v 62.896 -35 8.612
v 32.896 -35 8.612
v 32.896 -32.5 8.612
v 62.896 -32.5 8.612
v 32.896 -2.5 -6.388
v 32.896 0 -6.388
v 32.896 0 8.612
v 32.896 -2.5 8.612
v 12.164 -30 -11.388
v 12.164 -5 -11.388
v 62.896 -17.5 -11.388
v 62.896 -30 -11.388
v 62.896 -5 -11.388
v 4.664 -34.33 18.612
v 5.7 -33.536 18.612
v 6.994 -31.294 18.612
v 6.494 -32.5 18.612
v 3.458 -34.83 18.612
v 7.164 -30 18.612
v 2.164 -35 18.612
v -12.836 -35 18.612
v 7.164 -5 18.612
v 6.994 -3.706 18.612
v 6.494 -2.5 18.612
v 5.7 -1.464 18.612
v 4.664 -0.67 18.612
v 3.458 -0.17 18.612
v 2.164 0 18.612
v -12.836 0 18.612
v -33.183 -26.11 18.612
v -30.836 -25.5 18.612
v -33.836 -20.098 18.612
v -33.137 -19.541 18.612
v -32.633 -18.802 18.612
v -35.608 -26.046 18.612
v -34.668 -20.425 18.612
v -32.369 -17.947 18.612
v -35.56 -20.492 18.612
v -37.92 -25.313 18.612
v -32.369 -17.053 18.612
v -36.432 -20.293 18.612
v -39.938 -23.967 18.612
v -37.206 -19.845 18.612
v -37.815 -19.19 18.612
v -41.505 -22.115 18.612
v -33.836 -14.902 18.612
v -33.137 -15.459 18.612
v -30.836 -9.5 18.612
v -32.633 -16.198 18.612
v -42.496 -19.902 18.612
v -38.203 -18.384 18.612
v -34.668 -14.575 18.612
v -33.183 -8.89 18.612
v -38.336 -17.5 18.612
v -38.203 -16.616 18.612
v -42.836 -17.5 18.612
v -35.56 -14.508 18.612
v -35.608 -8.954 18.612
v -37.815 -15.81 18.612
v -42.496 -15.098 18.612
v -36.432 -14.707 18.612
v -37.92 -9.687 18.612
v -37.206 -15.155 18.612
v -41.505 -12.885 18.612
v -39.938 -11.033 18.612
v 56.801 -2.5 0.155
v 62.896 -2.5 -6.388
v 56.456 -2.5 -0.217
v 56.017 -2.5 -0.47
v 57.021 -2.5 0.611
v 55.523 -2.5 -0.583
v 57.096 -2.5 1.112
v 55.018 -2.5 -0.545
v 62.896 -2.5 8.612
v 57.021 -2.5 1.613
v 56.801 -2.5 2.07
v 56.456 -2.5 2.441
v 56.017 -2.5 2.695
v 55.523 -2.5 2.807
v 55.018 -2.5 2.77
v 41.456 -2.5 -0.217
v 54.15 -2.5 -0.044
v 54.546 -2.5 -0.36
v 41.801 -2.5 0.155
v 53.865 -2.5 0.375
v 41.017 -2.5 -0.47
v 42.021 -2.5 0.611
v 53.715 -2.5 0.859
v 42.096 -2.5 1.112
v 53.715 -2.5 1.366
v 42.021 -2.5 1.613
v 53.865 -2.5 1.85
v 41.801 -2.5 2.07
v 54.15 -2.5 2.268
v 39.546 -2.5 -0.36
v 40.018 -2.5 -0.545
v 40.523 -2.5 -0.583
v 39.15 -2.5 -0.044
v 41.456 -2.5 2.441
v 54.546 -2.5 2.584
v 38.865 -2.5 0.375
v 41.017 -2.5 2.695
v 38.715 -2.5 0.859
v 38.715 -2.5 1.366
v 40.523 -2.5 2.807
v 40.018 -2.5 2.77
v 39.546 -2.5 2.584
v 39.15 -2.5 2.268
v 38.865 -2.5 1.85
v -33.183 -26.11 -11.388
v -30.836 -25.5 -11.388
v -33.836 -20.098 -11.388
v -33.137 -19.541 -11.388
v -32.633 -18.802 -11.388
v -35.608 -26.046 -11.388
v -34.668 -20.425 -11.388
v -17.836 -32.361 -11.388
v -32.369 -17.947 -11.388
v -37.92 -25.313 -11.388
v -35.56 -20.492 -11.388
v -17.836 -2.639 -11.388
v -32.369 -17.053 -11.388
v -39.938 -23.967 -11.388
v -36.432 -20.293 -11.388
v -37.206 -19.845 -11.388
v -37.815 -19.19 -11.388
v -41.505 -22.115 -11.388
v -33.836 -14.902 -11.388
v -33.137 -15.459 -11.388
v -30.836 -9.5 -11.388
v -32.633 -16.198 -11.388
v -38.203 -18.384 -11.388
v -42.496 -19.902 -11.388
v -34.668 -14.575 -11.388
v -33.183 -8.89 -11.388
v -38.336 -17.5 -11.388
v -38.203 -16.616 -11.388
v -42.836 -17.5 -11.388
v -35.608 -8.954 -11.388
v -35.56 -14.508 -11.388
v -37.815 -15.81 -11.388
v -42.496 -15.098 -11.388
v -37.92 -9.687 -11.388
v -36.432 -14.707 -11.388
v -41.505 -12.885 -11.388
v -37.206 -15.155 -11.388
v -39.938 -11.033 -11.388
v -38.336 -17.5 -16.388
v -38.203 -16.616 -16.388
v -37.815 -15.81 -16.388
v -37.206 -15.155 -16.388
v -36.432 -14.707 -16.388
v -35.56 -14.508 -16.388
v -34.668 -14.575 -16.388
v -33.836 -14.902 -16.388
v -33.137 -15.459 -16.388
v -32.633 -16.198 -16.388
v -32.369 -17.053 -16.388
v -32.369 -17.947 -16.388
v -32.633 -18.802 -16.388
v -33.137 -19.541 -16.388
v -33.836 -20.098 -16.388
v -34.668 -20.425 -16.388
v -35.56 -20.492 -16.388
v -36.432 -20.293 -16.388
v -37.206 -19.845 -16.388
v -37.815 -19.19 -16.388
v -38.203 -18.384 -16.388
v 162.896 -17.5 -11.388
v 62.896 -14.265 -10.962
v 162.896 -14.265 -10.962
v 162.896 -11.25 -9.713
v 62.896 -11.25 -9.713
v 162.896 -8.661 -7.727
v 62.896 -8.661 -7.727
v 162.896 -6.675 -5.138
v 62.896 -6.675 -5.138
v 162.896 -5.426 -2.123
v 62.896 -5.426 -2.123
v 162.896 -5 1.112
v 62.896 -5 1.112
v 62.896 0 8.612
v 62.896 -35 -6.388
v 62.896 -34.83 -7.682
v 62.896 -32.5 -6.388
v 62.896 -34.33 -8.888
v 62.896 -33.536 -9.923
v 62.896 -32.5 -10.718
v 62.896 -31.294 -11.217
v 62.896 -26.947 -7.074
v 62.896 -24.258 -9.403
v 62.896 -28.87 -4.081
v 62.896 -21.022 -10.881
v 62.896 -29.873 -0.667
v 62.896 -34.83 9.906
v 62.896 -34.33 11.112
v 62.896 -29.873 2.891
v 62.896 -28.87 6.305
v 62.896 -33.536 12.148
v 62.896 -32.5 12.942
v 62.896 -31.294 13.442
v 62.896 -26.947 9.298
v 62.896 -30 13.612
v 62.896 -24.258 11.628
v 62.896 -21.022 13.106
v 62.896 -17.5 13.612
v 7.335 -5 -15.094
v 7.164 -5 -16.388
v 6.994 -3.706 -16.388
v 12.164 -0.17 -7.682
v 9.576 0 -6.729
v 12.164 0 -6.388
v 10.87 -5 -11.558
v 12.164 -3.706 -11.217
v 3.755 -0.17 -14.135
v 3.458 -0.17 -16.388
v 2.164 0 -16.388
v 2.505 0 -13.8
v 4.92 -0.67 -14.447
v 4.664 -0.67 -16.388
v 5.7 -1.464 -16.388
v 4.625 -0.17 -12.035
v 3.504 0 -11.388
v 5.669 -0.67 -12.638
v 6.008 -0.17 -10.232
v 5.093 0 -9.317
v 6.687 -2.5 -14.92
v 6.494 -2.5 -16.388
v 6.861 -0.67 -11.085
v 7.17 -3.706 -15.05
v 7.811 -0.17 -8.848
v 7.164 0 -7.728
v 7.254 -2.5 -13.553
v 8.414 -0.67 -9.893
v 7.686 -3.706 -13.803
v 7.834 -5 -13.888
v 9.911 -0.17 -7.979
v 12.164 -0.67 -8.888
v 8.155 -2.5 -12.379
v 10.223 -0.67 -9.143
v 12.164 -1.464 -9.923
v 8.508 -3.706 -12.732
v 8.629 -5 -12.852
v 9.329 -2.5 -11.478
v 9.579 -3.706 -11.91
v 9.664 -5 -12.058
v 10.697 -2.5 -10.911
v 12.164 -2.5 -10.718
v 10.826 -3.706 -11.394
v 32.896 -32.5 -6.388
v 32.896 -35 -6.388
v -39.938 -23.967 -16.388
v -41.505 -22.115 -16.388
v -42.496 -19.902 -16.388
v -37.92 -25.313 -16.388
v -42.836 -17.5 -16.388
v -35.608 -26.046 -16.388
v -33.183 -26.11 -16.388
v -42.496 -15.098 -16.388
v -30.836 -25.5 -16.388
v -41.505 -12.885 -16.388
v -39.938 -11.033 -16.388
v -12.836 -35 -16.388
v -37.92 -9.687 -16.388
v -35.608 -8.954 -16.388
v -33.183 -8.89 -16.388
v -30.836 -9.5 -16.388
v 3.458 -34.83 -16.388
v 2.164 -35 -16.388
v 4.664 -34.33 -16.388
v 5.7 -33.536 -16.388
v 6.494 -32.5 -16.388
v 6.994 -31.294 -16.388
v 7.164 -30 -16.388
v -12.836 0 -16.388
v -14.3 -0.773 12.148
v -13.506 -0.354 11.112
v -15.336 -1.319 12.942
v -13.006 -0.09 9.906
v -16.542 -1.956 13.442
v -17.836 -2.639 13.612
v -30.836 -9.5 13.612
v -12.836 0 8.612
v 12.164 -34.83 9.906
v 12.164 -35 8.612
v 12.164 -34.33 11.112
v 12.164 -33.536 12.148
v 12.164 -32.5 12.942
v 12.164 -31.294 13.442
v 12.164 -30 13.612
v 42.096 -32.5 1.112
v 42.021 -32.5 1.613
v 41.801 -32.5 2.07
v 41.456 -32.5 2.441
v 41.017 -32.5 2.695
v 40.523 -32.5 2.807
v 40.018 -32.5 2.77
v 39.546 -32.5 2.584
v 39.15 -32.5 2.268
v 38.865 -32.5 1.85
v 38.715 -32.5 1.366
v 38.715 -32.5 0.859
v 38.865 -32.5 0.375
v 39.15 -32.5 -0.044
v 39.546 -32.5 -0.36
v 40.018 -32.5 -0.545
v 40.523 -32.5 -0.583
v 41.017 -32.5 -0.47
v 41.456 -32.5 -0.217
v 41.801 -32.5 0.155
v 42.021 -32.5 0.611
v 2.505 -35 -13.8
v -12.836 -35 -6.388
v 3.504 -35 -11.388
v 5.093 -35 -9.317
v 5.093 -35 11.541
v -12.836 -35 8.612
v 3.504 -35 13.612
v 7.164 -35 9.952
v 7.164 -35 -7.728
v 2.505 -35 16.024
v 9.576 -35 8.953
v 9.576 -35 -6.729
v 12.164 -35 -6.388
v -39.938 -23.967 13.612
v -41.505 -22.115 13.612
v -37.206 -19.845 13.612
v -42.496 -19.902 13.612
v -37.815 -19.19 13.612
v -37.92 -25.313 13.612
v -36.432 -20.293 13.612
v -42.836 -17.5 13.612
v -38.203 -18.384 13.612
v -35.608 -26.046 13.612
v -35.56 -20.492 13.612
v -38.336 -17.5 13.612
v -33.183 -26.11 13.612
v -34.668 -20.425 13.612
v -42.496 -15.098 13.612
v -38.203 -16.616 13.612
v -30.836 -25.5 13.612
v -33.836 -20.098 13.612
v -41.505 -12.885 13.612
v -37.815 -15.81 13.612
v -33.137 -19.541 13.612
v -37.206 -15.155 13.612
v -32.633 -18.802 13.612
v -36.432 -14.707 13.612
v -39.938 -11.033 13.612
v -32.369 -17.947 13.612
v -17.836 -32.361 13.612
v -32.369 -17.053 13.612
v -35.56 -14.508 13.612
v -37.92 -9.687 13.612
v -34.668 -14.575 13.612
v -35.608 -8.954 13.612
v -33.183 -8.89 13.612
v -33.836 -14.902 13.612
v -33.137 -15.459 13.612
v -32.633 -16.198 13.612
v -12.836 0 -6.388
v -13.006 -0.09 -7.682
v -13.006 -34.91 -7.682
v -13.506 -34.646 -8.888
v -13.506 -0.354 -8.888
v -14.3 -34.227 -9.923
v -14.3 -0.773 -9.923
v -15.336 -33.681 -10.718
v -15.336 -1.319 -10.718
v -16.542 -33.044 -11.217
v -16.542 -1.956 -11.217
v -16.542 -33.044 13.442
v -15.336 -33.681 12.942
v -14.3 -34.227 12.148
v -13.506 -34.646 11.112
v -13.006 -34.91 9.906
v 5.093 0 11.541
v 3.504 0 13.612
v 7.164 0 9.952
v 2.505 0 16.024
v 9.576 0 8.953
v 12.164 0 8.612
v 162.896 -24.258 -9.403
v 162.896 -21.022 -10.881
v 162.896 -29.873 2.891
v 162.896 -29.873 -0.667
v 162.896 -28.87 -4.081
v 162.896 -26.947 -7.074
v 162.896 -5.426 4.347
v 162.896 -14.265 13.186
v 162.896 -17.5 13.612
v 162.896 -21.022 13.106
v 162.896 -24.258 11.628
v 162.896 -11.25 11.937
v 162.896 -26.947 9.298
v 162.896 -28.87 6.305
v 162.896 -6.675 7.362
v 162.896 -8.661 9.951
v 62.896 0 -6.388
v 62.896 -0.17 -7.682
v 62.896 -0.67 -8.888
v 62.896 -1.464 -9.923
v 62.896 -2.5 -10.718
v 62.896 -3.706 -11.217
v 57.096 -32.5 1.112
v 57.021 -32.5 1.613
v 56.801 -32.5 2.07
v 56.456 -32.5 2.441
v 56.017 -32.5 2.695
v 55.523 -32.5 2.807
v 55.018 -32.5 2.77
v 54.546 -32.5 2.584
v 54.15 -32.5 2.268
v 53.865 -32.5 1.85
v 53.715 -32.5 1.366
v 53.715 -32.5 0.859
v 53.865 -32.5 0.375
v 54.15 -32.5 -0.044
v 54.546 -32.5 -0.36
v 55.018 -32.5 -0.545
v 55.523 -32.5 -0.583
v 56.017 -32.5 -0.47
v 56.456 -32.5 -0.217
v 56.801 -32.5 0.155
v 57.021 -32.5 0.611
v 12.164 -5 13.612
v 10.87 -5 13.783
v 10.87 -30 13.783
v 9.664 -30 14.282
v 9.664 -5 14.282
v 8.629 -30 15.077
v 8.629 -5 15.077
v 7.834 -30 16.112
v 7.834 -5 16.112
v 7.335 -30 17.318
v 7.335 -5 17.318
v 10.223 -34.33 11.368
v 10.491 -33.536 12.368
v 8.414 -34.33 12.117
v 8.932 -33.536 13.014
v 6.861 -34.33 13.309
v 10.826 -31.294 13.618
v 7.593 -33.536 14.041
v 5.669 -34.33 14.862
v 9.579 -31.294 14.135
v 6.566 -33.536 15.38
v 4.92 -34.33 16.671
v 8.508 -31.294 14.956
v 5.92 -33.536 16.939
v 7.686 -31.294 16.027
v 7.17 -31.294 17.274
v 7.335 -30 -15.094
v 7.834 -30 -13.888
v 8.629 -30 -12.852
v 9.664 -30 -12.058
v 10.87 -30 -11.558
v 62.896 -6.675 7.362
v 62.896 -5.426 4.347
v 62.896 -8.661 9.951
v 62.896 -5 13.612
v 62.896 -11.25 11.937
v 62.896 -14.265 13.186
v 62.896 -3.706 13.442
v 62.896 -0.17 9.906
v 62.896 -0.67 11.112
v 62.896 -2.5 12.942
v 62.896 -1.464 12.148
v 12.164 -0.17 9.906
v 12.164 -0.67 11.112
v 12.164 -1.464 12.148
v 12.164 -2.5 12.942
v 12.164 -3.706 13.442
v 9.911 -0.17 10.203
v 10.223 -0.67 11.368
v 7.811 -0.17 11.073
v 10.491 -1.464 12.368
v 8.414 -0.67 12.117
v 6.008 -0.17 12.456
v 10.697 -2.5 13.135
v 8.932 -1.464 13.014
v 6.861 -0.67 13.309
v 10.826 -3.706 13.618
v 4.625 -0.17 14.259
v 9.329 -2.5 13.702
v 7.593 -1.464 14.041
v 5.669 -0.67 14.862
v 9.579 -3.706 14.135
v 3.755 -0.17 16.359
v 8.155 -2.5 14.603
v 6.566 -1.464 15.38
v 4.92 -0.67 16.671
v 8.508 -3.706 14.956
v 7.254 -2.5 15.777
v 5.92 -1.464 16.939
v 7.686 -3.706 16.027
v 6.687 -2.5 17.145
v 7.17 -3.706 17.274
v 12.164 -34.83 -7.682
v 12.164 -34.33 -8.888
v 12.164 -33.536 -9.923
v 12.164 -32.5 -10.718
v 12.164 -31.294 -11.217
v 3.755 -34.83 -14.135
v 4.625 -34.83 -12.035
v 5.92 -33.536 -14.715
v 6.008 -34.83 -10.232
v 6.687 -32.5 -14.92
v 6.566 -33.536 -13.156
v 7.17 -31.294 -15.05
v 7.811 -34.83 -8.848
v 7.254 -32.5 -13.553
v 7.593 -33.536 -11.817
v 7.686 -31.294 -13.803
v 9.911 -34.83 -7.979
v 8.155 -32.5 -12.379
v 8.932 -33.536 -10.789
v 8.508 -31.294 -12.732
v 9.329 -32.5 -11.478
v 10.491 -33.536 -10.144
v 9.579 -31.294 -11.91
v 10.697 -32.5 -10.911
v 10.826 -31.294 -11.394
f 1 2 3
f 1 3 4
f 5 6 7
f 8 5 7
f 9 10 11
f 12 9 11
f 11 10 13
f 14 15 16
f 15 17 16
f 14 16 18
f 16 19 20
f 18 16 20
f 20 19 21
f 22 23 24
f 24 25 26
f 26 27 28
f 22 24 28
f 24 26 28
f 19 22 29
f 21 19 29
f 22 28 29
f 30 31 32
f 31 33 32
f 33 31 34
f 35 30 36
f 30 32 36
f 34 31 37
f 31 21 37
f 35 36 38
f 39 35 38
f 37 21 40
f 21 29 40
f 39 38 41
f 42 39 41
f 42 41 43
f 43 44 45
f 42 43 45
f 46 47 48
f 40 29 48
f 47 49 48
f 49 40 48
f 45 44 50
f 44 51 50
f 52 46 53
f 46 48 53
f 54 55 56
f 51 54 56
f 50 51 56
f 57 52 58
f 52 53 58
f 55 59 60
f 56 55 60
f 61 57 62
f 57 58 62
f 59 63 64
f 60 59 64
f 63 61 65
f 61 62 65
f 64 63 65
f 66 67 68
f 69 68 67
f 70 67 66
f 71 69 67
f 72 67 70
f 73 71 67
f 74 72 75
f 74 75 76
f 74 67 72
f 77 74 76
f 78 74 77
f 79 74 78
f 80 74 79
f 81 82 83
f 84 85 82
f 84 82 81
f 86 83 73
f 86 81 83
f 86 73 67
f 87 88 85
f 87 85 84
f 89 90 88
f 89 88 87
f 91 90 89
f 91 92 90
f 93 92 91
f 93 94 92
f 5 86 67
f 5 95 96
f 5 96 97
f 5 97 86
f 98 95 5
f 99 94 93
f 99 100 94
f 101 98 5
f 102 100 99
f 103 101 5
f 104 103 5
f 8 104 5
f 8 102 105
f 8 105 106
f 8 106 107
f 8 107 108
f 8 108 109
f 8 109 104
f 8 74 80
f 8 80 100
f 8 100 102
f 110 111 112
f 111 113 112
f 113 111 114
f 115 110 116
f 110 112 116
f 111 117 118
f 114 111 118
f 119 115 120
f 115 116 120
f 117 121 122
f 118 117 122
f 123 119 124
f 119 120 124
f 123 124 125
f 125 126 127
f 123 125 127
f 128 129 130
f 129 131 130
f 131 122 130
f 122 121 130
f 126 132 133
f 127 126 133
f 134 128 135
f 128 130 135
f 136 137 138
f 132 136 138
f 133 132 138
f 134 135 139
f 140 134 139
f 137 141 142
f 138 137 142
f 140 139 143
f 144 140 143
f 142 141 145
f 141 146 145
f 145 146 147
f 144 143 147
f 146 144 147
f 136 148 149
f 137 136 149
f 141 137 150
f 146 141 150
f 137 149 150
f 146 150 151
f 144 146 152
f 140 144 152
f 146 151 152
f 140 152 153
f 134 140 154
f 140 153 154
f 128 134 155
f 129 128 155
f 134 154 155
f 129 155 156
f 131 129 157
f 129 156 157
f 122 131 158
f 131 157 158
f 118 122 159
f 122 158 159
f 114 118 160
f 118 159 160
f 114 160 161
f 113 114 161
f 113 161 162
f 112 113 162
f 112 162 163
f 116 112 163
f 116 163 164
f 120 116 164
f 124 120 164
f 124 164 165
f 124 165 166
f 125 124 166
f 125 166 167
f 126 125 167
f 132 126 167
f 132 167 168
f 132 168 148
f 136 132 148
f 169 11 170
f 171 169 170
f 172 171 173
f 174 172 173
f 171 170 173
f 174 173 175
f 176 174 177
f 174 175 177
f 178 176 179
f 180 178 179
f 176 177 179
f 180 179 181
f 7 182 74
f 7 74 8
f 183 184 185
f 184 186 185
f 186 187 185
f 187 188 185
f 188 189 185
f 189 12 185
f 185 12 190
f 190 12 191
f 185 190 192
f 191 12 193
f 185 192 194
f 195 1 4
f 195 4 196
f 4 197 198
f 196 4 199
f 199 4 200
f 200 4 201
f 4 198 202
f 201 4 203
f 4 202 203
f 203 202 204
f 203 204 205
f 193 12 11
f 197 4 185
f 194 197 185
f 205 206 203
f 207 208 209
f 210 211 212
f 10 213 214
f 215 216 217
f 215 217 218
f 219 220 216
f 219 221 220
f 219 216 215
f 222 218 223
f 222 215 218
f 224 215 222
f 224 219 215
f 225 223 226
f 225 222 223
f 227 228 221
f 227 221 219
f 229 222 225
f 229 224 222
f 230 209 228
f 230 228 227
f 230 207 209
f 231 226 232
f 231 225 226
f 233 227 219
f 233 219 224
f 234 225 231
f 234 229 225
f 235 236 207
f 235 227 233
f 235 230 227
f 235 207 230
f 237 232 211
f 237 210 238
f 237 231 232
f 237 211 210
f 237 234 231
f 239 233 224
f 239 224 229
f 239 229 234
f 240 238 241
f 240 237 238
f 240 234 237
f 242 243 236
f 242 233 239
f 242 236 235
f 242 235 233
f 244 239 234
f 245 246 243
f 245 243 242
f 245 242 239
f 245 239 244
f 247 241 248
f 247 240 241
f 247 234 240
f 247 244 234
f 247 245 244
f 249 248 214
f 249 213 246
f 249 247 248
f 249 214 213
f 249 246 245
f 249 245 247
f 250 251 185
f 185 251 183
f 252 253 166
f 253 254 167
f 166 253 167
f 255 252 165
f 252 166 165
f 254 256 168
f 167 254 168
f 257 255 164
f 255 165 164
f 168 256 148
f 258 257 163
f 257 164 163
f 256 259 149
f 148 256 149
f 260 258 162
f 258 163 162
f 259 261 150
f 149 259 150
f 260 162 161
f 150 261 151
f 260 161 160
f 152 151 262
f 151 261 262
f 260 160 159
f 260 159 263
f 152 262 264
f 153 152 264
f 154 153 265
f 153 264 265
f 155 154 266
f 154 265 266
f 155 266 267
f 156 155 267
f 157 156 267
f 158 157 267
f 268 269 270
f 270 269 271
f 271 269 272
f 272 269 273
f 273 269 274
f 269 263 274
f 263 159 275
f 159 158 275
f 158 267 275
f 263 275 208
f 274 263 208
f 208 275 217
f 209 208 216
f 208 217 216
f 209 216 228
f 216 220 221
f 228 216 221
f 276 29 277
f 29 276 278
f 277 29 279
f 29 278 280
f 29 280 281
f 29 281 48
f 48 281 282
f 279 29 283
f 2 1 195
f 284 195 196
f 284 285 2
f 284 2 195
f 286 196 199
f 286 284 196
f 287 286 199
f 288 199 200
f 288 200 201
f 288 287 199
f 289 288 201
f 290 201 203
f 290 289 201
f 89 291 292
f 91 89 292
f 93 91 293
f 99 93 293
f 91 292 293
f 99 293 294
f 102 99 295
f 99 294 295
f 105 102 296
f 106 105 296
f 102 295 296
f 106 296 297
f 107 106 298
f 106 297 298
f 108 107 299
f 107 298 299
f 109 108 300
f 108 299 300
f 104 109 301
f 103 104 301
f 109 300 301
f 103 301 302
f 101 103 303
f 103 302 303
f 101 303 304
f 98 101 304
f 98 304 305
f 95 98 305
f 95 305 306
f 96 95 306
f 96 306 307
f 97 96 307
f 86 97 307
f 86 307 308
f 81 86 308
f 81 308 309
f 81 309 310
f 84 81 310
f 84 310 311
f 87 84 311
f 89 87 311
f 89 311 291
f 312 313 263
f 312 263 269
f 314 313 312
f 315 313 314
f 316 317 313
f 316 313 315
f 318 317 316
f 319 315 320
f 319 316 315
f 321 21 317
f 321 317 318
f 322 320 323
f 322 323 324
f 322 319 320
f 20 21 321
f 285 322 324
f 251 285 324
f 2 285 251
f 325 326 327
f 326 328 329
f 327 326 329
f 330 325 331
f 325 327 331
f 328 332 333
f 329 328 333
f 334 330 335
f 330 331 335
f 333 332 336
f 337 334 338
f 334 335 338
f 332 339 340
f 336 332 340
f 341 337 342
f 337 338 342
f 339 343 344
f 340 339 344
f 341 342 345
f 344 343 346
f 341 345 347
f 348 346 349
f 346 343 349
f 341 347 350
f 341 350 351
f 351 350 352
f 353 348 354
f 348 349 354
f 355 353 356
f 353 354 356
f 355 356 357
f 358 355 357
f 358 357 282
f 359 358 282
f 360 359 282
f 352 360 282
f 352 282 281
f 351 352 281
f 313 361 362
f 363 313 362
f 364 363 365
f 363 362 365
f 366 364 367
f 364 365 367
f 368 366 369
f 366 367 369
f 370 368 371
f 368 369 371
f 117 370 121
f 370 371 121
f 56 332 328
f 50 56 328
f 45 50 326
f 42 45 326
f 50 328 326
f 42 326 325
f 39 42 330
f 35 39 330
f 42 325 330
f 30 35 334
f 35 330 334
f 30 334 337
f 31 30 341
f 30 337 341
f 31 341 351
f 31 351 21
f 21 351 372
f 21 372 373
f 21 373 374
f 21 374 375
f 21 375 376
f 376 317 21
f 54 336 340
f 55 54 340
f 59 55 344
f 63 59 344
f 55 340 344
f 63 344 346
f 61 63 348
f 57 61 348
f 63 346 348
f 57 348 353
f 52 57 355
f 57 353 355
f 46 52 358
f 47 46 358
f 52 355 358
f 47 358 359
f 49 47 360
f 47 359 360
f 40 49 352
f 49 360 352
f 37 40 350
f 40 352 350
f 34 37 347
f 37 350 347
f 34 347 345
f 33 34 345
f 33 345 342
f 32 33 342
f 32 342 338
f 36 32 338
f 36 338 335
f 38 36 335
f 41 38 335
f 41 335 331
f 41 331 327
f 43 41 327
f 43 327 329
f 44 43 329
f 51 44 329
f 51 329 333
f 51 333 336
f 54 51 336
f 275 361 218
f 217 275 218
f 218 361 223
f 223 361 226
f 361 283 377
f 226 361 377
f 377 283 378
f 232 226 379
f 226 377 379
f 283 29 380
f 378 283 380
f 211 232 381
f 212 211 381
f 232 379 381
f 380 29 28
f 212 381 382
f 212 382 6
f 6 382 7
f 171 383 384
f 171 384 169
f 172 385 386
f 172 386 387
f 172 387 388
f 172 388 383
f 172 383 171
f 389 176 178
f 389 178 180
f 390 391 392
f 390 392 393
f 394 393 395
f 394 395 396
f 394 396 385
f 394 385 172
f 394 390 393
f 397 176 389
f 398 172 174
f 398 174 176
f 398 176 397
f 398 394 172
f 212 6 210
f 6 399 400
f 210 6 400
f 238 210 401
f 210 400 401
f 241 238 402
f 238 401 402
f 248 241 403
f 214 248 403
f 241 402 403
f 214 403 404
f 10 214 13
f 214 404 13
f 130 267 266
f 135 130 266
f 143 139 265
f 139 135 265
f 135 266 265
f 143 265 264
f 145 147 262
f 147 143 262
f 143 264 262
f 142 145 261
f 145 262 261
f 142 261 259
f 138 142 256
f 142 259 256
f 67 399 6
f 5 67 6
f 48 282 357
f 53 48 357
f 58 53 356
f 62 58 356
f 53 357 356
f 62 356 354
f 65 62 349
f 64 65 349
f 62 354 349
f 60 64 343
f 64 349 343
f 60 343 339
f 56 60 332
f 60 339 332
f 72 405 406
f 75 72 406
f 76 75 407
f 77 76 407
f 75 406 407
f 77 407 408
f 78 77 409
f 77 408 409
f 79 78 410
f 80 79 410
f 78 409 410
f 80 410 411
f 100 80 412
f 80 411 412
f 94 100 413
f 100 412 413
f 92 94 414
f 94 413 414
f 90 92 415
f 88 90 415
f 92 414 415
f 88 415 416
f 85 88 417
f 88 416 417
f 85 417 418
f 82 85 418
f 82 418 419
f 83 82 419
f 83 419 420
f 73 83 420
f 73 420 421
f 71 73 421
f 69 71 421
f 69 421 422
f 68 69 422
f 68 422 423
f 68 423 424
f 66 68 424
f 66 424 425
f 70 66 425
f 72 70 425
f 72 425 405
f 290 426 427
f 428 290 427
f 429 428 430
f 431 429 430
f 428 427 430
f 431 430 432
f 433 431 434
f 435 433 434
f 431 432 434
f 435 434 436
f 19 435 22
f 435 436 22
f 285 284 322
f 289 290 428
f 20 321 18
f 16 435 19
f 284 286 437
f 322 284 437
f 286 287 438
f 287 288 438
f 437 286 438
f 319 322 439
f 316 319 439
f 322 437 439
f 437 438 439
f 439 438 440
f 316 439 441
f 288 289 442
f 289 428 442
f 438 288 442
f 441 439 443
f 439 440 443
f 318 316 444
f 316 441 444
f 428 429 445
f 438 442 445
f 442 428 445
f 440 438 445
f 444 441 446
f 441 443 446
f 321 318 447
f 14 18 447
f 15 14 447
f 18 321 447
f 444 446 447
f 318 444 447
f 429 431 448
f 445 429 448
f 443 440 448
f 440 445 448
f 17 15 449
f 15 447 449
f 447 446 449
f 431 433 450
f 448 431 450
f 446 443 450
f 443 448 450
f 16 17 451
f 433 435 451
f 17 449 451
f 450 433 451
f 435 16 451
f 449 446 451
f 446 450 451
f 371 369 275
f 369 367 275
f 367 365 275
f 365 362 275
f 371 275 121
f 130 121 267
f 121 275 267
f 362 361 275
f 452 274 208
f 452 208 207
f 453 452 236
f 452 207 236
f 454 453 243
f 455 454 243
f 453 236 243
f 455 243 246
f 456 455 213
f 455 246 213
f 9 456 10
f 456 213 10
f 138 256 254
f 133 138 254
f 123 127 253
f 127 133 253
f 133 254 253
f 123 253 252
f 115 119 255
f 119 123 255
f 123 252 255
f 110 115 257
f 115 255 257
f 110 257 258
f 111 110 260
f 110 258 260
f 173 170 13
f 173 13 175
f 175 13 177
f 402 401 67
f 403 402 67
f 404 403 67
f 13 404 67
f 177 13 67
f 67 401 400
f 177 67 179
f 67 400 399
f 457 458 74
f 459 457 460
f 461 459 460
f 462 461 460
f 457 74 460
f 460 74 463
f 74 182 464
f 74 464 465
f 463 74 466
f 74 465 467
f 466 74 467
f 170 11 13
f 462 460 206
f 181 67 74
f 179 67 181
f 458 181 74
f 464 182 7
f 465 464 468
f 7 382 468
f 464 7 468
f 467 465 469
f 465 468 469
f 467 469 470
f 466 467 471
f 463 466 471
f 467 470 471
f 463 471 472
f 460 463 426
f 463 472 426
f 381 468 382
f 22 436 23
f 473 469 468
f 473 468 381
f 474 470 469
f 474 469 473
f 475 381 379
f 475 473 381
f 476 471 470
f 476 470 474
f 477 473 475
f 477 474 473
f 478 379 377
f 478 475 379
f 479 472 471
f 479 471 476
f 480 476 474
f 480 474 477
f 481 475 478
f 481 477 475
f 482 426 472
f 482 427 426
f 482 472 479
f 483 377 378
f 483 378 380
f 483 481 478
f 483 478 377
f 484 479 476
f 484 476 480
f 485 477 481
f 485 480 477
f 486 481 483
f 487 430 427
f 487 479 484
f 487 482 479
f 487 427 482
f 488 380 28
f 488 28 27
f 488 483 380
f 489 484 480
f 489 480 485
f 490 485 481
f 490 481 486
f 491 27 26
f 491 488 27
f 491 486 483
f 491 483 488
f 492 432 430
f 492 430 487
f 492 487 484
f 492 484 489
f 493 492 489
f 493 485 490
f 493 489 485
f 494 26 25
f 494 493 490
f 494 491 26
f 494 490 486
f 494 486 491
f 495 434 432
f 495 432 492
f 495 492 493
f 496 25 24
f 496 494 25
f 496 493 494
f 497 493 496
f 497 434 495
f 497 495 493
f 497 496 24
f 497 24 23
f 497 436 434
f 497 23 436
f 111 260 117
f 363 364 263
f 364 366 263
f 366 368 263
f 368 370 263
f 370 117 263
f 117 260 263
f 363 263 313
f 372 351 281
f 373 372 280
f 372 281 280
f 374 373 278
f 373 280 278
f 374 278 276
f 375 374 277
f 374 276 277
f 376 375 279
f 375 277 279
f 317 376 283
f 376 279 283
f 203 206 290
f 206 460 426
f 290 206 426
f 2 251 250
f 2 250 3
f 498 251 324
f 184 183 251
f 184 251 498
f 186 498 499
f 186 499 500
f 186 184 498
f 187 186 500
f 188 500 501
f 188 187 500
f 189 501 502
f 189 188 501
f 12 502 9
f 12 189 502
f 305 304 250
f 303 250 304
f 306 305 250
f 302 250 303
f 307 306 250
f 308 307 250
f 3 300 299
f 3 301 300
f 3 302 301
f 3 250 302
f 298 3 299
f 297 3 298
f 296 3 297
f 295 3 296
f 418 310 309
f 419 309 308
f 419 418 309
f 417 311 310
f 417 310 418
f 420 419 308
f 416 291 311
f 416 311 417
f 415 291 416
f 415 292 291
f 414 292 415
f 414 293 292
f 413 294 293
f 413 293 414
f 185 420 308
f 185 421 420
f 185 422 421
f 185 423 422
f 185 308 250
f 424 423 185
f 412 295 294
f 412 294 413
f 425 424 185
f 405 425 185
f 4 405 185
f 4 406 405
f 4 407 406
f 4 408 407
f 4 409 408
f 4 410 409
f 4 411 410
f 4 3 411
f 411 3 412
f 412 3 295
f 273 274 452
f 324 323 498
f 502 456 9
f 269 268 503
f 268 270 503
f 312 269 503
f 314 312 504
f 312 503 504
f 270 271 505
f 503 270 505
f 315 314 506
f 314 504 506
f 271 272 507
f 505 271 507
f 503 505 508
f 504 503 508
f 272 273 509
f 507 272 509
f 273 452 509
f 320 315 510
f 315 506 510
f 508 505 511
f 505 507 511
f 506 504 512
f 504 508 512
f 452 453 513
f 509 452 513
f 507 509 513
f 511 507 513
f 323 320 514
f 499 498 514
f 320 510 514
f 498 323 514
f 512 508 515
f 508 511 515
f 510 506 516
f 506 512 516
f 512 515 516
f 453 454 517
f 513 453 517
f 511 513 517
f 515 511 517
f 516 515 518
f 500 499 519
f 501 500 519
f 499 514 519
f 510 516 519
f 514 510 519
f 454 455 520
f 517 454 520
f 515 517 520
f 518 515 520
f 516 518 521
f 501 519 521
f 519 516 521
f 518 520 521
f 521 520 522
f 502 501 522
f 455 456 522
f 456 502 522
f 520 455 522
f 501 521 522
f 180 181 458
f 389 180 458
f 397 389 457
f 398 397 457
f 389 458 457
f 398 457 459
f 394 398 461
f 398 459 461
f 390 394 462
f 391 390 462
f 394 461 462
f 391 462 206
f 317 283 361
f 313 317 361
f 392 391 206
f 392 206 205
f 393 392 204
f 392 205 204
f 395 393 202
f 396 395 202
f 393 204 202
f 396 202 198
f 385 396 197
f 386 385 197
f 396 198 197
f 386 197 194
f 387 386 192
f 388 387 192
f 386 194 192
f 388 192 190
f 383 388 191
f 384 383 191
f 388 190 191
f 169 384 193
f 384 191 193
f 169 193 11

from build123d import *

# Parameters (mm, degrees)
F1_DEPTH  = 35
F2_W      = 30
F2_H      = 15
F3_DEPTH  = 2.5
F4_W      = 30
F4_H      = 15
F5_DEPTH  = 2.5
F7_D      = 3.4
F8_R      = 5
F10_D     = 6
F12_DEPTH = 35
F14_DEPTH = 100


with BuildPart() as f1:
    # F0 (on Front) → F1 (new body)
    with BuildSketch(Plane.XZ):
        with BuildLine():
            Line((7.1641441025, 18.6121761102), (-12.8358558975, 18.6121761102))
            Line((-12.8358558975, 18.6121761102), (-42.8358558975, 18.6121761102))
            Line((-42.8358558975, 18.6121761102), (-42.8358558975, 13.6121761102))
            Line((-42.8358558975, 13.6121761102), (-17.8358558975, 13.6121761102))
            ThreePointArc((-17.8358558975, 13.6121761102), (-14.3003219916, 12.1477100161), (-12.8358558975, 8.6121761102))
            Line((-12.8358558975, 8.6121761102), (-12.8358558975, -6.3878238898))
            ThreePointArc((-12.8358558975, -6.3878238898), (-14.3003219916, -9.9233577957), (-17.8358558975, -11.3878238898))
            Line((-17.8358558975, -11.3878238898), (-42.8358558975, -11.3878238898))
            Line((-42.8358558975, -11.3878238898), (-42.8358558975, -16.3878238898))
            Line((-42.8358558975, -16.3878238898), (-12.8358558975, -16.3878238898))
            Line((-12.8358558975, -16.3878238898), (7.1641441025, -16.3878238898))
            ThreePointArc((7.1641441025, -16.3878238898), (8.6286101965, -12.8522899839), (12.1641441025, -11.3878238898))
            Line((12.1641441025, -11.3878238898), (62.8961617798, -11.3878238898))
            Line((62.8961617798, -11.3878238898), (62.8961617798, 13.6121761102))
            Line((62.8961617798, 13.6121761102), (12.1641441025, 13.6121761102))
            ThreePointArc((12.1641441025, 13.6121761102), (8.6286101965, 15.0766422043), (7.1641441025, 18.6121761102))
        make_face()
    extrude(amount=F1_DEPTH)

    # F2 (on face) → F3 (cut)
    with BuildSketch(Plane.XZ.offset(35)):
        with Locations((47.8961617798, 1.1121761102)):
            Rectangle(F2_W, F2_H)
    extrude(amount=-F3_DEPTH, mode=Mode.SUBTRACT)

    # F4 (on face) → F5 (cut)
    with BuildSketch(Plane(origin=(0, 0, 0), x_dir=(-1, 0, 0), z_dir=(0, 1, 0))):
        with Locations((-47.8961617798, 1.1121761102)):
            Rectangle(F4_W, F4_H)
    extrude(amount=-F5_DEPTH, mode=Mode.SUBTRACT)

    # F7 (through all)
    with Locations(Plane(origin=(0, -2.5, 0), x_dir=(-1, 0, 0), z_dir=(0, 1, 0))):
        with Locations((-55.3961617798, 1.1121761102), (-40.3961617798, 1.1121761102)):
            Hole(F7_D / 2)

    # F8
    f8_edges = [f1.edges().sort_by_distance(p)[0] for p in [
        (37.530153, 0, -11.387824),
        (37.530153, 0, 13.612176),
        (37.530153, -35, 13.612176),
        (37.530153, -35, -11.387824),
    ]]
    fillet(f8_edges, radius=F8_R)

    # F10 (through all)
    with Locations(Plane.XY.offset(18.6121761102)):
        with Locations((-35.3358558975, -17.5)):
            Hole(F10_D / 2)

    # F11 (on face) → F12 (cut)
    with BuildSketch(Plane(origin=(0, 0, -16.3878238898), x_dir=(1, 0, 0), z_dir=(0, 0, -1))):
        with BuildLine():
            Line((-42.8358558975, 0), (-12.8358558975, 0))
            Line((-12.8358558975, 0), (-30.8358558975, 9.5))
            ThreePointArc((-30.8358558975, 9.5), (-38.9765909315, 10.2888974491), (-42.8358558975, 17.5))
            Line((-42.8358558975, 17.5), (-42.8358558975, 0))
        make_face()
        with BuildLine():
            Line((-30.8358558975, 25.5), (-12.8358558975, 35))
            Line((-12.8358558975, 35), (-42.8358558975, 35))
            Line((-42.8358558975, 35), (-42.8358558975, 17.5))
            ThreePointArc((-42.8358558975, 17.5), (-38.9765909315, 24.7111025509), (-30.8358558975, 25.5))
        make_face()
    extrude(amount=-F12_DEPTH, mode=Mode.SUBTRACT)

    # F13 (on face) → F14 (join)
    with BuildSketch(Plane.YZ.offset(62.8961617798)):
        with BuildLine():
            ThreePointArc((-17.5, -11.3878238898), (-8.6611652352, -7.7266586546), (-5, 1.1121761102))
            ThreePointArc((-5, 1.1121761102), (-8.6611652352, 9.951010875), (-17.5, 13.6121761102))
            ThreePointArc((-17.5, 13.6121761102), (-30, 1.1121761102), (-17.5, -11.3878238898))
        make_face()
    extrude(amount=F14_DEPTH)


solid = f1.part
